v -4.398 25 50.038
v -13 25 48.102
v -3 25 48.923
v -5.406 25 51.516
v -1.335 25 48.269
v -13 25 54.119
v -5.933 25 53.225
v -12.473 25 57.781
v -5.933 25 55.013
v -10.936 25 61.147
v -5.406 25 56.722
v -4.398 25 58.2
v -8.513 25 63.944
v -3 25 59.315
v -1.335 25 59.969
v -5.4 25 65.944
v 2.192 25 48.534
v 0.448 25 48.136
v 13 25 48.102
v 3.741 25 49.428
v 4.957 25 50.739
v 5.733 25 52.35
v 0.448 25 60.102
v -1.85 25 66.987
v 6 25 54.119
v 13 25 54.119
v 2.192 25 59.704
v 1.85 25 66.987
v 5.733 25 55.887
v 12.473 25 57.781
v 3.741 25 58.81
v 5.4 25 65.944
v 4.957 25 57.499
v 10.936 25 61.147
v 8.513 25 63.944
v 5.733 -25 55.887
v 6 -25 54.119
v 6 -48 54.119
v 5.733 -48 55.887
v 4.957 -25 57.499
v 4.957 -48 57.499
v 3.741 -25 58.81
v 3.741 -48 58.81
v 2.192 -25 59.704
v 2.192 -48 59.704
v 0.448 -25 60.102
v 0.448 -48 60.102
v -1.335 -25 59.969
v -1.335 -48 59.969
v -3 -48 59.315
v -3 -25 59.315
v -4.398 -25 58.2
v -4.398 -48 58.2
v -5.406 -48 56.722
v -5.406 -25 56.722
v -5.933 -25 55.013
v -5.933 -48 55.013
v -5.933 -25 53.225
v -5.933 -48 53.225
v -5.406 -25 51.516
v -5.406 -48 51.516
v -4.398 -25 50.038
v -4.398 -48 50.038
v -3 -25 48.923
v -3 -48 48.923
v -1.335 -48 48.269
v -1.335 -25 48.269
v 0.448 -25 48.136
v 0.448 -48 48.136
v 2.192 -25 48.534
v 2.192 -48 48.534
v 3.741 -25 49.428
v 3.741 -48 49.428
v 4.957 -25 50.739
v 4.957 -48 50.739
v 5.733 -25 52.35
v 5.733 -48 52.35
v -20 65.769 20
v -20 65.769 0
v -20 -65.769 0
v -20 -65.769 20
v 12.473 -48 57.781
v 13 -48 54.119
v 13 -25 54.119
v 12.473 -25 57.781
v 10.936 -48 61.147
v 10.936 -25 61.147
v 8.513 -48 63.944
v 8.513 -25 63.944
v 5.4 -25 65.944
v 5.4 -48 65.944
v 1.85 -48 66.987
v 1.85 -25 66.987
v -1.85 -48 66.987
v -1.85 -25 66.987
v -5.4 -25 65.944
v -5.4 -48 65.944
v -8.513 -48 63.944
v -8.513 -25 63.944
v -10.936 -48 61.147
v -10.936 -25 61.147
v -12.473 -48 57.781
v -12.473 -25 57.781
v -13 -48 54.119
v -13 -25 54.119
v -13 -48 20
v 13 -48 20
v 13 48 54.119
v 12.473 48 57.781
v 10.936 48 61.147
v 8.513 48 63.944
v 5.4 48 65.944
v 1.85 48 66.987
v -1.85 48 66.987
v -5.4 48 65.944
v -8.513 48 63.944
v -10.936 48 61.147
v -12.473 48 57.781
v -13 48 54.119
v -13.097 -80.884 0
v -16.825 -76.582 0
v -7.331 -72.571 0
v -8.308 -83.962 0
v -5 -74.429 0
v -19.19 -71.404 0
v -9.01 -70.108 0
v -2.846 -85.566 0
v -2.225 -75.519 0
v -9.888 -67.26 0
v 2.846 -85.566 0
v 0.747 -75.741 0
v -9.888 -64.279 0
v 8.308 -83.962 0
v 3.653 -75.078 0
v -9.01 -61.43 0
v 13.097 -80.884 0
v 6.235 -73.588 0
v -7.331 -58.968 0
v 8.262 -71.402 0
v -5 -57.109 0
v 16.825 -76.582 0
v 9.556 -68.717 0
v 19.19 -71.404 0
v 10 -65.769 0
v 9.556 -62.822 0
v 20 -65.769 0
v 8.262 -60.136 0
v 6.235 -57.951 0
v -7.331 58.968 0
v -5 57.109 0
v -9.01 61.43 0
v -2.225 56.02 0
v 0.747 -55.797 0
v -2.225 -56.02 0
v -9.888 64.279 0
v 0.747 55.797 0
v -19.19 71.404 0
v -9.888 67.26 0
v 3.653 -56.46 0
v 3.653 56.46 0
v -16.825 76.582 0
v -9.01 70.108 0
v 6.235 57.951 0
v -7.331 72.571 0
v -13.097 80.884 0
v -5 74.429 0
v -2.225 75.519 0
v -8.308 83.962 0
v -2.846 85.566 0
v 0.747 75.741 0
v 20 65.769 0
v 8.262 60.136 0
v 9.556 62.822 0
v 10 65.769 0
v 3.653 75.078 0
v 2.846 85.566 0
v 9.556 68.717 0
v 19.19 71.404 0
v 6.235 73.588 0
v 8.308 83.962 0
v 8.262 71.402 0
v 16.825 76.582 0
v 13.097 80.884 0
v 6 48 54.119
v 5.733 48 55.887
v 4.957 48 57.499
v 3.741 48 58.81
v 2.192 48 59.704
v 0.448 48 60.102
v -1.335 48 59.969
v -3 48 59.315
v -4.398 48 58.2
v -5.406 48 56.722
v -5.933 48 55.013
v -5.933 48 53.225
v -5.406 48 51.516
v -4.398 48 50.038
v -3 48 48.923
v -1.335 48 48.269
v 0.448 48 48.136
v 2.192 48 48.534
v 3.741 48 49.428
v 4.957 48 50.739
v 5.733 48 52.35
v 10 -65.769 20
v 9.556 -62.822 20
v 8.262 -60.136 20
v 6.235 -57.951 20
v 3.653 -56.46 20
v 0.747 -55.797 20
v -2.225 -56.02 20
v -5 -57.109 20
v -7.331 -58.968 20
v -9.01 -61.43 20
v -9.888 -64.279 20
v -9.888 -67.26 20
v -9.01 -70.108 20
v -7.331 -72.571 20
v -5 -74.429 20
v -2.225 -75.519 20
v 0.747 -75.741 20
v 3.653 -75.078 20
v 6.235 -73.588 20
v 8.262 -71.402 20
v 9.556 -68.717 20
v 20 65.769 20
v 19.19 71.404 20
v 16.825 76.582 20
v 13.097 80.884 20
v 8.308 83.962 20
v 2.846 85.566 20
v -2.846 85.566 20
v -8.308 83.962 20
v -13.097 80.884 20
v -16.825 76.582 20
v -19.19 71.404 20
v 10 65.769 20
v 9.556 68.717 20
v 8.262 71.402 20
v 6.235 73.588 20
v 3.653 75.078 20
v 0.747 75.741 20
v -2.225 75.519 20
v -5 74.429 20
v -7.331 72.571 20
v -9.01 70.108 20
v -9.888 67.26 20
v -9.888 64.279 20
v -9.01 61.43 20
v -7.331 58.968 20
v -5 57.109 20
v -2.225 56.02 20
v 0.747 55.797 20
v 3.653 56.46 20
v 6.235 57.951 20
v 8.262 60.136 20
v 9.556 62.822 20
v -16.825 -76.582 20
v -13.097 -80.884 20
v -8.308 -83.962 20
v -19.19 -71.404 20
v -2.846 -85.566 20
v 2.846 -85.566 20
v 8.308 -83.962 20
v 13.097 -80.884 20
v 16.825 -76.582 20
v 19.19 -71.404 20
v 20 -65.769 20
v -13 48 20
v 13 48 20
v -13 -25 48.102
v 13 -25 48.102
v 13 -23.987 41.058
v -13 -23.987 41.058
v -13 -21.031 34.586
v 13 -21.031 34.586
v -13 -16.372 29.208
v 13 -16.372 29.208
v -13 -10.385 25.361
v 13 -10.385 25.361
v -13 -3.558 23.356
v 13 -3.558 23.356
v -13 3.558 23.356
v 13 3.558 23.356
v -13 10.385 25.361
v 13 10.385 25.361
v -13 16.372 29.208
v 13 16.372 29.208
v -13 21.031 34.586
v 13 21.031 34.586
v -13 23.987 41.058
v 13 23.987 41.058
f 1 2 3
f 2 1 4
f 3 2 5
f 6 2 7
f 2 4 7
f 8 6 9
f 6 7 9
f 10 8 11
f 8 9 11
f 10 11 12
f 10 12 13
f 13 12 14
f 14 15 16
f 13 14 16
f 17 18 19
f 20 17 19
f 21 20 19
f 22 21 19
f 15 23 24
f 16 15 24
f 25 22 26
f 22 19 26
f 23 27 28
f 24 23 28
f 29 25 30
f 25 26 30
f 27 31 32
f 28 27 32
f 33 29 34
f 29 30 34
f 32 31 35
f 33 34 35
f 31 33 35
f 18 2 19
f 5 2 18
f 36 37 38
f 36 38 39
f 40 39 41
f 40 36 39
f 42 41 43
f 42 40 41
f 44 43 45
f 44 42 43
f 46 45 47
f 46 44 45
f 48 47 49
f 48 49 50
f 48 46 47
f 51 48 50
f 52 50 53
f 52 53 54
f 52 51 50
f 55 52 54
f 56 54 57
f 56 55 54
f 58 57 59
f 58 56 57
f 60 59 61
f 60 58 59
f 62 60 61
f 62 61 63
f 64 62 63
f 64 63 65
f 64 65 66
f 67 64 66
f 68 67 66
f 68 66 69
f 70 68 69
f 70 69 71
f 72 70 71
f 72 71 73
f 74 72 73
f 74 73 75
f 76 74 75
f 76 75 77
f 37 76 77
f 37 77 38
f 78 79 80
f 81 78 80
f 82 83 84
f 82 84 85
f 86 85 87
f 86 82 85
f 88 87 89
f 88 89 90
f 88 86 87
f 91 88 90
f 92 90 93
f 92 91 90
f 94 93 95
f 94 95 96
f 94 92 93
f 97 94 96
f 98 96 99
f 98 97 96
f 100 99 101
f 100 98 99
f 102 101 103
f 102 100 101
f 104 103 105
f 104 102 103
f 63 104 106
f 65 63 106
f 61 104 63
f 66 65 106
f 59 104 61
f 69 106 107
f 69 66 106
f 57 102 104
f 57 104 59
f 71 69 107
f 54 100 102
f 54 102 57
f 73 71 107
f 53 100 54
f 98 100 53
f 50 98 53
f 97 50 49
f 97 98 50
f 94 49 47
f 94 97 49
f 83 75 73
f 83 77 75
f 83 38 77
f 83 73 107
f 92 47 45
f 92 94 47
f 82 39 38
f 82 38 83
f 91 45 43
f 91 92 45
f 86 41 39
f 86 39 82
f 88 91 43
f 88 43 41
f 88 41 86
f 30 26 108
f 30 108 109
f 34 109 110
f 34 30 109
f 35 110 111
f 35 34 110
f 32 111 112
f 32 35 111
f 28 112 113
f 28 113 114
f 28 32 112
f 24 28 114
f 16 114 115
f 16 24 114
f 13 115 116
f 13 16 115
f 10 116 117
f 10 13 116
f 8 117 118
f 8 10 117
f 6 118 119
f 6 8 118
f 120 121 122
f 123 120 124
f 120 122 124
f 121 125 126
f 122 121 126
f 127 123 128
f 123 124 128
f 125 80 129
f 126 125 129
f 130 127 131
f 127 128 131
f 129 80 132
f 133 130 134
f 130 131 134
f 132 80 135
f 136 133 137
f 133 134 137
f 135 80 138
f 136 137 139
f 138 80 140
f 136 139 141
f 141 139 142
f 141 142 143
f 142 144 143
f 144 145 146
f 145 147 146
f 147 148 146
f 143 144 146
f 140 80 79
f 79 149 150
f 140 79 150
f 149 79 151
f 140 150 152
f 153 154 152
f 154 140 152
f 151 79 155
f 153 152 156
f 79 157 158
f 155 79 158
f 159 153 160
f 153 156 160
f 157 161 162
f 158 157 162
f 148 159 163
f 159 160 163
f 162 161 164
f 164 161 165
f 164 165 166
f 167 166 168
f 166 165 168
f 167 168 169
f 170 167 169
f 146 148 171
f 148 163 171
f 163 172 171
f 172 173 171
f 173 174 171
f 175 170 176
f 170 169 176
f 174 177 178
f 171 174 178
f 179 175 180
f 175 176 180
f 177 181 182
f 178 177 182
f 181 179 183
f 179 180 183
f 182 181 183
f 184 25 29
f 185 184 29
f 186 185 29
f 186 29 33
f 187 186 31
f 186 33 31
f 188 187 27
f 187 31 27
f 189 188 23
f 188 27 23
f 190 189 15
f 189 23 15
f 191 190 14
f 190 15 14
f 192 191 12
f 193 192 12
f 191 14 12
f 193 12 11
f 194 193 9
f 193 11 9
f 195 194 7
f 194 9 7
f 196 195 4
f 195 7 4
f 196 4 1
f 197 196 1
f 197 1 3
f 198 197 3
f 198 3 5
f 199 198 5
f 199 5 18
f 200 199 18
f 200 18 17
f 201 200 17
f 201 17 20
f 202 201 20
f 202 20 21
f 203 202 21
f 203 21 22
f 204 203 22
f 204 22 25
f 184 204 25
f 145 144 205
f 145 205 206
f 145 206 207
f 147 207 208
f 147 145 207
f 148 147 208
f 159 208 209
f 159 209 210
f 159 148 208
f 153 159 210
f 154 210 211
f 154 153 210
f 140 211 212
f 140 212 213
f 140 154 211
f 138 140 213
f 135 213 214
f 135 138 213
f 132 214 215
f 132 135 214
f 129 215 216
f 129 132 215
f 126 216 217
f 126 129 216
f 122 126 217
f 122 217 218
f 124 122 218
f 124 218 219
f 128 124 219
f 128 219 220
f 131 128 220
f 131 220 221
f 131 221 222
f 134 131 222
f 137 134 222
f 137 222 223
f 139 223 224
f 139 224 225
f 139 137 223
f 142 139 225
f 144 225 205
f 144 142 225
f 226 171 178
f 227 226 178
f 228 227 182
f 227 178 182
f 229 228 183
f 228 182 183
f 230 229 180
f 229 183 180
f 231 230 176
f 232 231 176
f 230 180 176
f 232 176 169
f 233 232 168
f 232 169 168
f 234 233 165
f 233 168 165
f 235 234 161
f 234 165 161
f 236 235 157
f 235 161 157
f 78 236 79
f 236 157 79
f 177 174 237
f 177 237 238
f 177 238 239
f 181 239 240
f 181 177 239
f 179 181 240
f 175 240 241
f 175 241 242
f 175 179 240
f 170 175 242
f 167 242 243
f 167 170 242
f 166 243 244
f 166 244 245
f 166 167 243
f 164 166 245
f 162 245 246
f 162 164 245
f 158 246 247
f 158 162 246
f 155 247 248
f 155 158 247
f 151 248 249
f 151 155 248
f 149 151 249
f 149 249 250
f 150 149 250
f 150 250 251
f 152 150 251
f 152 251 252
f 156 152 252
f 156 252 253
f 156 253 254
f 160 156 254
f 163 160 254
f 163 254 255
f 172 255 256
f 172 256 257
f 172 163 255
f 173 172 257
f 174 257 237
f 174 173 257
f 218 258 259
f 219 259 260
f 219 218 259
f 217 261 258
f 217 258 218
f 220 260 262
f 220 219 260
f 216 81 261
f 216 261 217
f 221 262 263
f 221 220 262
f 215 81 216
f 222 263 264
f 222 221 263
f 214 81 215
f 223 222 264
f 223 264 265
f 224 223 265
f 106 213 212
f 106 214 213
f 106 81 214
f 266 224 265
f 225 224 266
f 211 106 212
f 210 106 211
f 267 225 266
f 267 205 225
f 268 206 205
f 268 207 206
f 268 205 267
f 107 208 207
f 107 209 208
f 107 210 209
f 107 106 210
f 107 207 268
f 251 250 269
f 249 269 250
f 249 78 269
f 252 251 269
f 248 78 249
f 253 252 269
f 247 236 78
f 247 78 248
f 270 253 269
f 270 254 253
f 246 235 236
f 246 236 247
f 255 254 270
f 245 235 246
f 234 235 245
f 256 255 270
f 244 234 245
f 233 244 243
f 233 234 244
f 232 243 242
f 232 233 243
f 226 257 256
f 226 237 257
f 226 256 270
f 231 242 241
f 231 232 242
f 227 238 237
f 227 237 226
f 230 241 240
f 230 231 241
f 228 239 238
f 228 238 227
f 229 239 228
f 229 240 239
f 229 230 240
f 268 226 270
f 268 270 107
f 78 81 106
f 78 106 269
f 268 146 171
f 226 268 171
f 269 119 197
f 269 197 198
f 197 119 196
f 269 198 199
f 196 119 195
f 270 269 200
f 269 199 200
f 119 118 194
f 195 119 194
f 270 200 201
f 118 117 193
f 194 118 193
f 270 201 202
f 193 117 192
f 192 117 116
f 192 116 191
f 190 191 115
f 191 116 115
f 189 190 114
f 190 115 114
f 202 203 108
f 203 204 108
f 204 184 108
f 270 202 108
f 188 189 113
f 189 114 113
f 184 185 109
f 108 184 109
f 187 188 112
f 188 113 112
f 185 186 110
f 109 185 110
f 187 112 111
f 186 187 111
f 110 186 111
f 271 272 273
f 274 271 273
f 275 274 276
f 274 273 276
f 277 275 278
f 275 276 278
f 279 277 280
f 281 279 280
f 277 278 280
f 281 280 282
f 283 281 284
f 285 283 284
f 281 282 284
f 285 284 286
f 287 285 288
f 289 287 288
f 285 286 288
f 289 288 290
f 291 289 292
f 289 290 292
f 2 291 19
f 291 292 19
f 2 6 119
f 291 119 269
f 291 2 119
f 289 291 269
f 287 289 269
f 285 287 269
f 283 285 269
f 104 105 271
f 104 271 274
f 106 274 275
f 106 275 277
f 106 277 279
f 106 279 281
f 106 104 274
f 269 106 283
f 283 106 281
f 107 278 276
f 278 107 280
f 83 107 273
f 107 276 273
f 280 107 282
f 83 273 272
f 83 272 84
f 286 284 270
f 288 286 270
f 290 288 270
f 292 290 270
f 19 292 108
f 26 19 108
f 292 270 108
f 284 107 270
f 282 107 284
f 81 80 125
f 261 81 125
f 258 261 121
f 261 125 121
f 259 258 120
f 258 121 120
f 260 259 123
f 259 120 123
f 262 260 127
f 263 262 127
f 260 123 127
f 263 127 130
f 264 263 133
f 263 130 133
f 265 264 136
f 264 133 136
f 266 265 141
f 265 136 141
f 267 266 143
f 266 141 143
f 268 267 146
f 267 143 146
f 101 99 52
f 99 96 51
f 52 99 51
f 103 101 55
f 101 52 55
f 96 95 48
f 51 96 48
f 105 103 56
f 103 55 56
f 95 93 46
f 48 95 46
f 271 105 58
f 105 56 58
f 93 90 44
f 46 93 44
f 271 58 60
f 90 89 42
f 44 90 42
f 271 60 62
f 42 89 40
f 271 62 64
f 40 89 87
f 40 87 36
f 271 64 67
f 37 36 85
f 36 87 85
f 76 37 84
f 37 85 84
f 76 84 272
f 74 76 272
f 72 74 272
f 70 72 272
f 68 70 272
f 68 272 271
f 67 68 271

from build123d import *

# Parameters (mm, degrees)
F0_R          = 10
F1_DEPTH      = 20
F2_R          = 6
F3_DEPTH      = 48
F3_DEPTH_BACK = 48
F4_W          = 50
F4_H          = 48.9827908203
F5_DEPTH      = 26


with BuildPart() as f1:
    # F0 (on Top) → F1 (new body)
    with BuildSketch(Plane.XY):
        with BuildLine():
            Line((20, -65.7692336577), (20, 65.7692336577))
            ThreePointArc((20, 65.7692336577), (0, 85.7692336577), (-20, 65.7692336577))
            Line((-20, 65.7692336577), (-20, -65.7692336577))
            ThreePointArc((-20, -65.7692336577), (0, -85.7692336577), (20, -65.7692336577))
        make_face()
        with Locations((0, -65.7692336577)):
            Circle(F0_R, mode=Mode.SUBTRACT)
        with Locations((0, 65.7692336577)):
            Circle(F0_R, mode=Mode.SUBTRACT)
    extrude(amount=F1_DEPTH)

    # F2 (on Front) → F3 (join, two sides)
    with BuildSketch(Plane.XZ) as f3_sk:
        with BuildLine():
            Line((-13, 19.118946977), (13, 19.118946977))
            Line((13, 19.118946977), (13, 30.0338421203))
            Line((13, 30.0338421203), (13, 54.118946977))
            ThreePointArc((13, 54.118946977), (0, 67.118946977), (-13, 54.118946977))
            Line((-13, 54.118946977), (-13, 30.0338421203))
            Line((-13, 30.0338421203), (-13, 19.118946977))
        make_face()
        with Locations((0, 54.118946977)):
            Circle(F2_R, mode=Mode.SUBTRACT)
    extrude(amount=F3_DEPTH)
    extrude(f3_sk.sketch, amount=-F3_DEPTH_BACK)

    # F4 (on face) → F5 (cut, through all)
    with BuildSketch(Plane.YZ.offset(13)):
        with BuildLine():
            Line((-25.0000003725, 54.118946977), (-25.0000003725, 48.1017377973))
            ThreePointArc((-25.0000003725, 48.1017377973), (-3.725e-07, 23.1017377973), (24.9999996275, 48.1017377973))
            Line((24.9999996275, 48.1017377973), (24.9999996275, 54.118946977))
            Line((24.9999996275, 54.118946977), (-25.0000003725, 54.118946977))
        make_face()
        with Locations((-3.725e-07, 78.6103423871)):
            Rectangle(F4_W, F4_H)
    extrude(amount=-F5_DEPTH, mode=Mode.SUBTRACT)


solid = f1.part
